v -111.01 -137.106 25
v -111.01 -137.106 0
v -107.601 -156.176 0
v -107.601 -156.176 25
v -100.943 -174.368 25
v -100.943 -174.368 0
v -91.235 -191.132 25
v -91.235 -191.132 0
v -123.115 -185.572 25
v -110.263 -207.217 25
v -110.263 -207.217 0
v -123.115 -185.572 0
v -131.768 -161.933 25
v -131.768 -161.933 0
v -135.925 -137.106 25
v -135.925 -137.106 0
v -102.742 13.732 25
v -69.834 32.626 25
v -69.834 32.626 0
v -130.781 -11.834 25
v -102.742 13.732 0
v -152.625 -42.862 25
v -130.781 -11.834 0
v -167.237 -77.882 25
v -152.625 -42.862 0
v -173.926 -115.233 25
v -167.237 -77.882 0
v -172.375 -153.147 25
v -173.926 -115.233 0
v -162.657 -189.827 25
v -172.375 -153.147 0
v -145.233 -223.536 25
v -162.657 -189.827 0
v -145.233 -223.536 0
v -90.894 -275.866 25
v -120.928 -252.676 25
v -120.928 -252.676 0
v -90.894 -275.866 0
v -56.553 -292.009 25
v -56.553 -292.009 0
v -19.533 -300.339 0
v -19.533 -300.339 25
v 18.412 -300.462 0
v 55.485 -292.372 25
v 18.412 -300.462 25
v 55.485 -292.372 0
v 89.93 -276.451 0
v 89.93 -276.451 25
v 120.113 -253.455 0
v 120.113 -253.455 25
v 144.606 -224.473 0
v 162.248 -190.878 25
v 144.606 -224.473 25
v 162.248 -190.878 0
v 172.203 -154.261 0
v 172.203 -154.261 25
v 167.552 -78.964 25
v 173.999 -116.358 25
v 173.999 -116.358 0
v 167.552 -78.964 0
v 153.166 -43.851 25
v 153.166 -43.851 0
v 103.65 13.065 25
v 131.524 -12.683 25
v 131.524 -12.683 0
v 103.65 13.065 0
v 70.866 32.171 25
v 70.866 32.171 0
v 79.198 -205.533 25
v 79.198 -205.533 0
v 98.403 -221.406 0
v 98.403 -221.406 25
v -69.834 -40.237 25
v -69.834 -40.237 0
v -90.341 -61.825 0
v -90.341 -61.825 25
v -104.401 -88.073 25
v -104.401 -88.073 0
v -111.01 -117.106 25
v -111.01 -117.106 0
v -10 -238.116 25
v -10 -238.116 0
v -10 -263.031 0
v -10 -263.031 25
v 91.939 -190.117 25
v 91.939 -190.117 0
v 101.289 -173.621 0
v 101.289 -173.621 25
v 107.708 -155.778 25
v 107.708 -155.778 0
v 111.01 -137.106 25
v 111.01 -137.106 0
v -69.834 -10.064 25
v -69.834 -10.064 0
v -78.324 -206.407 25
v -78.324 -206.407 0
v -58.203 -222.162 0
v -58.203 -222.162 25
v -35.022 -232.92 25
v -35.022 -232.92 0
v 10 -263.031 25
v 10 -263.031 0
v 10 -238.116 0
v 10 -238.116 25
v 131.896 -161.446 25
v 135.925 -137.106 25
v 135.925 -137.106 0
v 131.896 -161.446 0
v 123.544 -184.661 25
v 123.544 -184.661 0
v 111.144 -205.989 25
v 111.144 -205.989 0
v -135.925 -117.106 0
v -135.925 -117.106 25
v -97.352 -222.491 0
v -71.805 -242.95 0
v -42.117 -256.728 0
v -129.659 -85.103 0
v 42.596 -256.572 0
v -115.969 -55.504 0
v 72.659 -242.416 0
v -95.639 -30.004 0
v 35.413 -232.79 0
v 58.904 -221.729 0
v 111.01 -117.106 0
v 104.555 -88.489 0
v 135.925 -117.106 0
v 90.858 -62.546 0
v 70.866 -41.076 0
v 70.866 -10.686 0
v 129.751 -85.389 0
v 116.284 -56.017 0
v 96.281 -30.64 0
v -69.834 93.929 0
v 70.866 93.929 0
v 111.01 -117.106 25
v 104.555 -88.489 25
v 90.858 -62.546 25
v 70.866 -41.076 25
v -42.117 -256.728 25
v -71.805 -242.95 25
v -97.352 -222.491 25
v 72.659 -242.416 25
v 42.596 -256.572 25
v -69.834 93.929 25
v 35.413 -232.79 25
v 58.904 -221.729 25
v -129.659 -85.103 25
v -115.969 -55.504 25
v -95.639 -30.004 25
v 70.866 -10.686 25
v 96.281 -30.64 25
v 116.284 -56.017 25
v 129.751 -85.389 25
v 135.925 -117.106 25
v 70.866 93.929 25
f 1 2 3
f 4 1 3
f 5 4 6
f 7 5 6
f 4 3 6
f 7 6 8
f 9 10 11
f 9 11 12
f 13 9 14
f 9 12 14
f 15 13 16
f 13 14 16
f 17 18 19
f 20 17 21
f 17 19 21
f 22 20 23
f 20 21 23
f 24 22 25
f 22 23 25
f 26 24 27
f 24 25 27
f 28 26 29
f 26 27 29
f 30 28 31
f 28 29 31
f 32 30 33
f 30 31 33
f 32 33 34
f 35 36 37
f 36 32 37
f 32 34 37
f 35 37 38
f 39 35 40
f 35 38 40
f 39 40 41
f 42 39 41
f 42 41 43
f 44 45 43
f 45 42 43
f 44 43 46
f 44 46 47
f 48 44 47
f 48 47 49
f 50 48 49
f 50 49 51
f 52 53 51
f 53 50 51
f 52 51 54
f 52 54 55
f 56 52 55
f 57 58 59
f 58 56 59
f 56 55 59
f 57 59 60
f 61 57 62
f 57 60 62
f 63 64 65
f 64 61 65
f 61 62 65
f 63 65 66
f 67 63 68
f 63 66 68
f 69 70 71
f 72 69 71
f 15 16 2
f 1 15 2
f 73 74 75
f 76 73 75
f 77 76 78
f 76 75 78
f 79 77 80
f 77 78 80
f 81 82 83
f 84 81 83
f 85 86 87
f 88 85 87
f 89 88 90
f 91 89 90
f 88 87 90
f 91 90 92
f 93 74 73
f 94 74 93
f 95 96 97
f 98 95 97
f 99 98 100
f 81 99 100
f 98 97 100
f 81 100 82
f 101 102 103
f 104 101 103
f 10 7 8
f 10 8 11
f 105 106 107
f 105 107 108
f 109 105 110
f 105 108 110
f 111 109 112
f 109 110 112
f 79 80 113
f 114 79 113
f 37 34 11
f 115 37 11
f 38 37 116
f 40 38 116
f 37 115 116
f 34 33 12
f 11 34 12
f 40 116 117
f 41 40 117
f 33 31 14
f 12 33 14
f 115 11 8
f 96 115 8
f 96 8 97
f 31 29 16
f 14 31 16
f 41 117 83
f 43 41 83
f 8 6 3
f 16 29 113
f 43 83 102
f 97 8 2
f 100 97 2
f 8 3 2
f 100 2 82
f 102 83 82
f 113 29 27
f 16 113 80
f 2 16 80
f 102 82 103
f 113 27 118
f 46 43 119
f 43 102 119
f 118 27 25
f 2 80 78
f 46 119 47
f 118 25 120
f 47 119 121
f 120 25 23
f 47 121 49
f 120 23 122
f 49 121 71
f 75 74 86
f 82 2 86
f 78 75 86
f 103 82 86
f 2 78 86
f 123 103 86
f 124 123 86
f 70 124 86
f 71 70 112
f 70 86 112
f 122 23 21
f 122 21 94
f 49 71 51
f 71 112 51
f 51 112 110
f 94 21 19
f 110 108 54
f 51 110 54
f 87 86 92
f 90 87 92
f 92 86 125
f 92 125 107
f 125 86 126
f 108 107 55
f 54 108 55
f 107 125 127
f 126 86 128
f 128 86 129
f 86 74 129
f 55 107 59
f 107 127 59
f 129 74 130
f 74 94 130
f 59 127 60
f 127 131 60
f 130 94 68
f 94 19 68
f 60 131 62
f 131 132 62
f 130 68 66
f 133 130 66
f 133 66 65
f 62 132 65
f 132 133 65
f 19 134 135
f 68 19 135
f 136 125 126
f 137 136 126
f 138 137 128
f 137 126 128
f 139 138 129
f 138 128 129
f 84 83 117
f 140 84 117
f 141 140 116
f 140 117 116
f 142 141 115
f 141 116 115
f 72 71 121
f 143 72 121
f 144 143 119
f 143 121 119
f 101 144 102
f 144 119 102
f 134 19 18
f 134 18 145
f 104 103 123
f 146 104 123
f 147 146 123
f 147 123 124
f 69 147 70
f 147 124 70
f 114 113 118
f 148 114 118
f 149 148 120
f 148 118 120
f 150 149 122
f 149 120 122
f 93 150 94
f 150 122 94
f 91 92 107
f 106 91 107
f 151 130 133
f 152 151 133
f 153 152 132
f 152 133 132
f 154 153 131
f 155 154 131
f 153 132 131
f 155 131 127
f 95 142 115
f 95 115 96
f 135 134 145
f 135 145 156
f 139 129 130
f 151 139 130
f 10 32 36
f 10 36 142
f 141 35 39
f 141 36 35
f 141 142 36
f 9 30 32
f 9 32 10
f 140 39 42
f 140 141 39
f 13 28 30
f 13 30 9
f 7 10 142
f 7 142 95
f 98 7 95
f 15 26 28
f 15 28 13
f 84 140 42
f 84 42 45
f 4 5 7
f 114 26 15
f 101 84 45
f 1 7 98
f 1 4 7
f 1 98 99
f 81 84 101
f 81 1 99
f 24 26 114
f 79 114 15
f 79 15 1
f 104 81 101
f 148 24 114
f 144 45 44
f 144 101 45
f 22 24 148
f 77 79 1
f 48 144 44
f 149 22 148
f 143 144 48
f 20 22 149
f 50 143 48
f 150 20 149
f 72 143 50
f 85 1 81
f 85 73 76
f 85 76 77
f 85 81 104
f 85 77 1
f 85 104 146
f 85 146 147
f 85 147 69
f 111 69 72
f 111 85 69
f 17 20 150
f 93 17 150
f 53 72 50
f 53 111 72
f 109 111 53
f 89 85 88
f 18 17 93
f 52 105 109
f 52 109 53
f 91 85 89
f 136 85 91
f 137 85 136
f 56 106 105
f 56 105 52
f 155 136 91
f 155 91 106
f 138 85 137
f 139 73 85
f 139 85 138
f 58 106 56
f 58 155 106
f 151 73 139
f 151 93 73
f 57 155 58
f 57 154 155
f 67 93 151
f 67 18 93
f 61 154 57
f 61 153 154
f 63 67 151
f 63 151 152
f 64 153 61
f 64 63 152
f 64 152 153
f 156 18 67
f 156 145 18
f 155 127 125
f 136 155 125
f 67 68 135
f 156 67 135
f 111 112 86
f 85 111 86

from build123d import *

# Parameters (mm, degrees)
F0_W     = 140.7
F0_H     = 280
F1_DEPTH = 25
F2_R     = 174.3309751569
F3_DEPTH = 25


with BuildPart() as f1:
    # F0 (on Top) → F1 (new body)
    with BuildSketch(Plane.XY):
        with Locations((0.5157602191, -46.0708594322)):
            Rectangle(F0_W, F0_H)
    extrude(amount=F1_DEPTH)

    # F2 (on Top) → F3 (join)
    with BuildSketch(Plane.XY):
        with Locations((0, -127.1062195301)):
            Circle(F2_R)
        with BuildLine():
            ThreePointArc((135.9251850135, -117.1062195301), (136.2006688085, -122.1028469617), (136.2925380237, -127.1062195301))
            ThreePointArc((136.2925380237, -127.1062195301), (136.2006688085, -132.1095920985), (135.9251850135, -137.1062195301))
            ThreePointArc((135.9251850135, -137.1062195301), (128.2461669599, -173.2427189751), (111.1444855362, -205.9894196163))
            ThreePointArc((111.1444855362, -205.9894196163), (105.0571290732, -213.9316510109), (98.4034458961, -221.4058364791))
            ThreePointArc((98.4034458961, -221.4058364791), (58.0603027008, -250.4133854664), (10, -263.0314045436))
            ThreePointArc((10, -263.0314045436), (0, -263.3987575538), (-10, -263.0314045436))
            ThreePointArc((-10, -263.0314045436), (-57.3758238008, -250.7333636536), (-97.3518624436, -222.4910757689))
            ThreePointArc((-97.3518624436, -222.4910757689), (-104.0880057129, -215.0911215739), (-110.2630464775, -207.2168711467))
            ThreePointArc((-110.2630464775, -207.2168711467), (-127.9884260341, -173.9529773929), (-135.9251850135, -137.1062195301))
            ThreePointArc((-135.9251850135, -137.1062195301), (-136.2925380237, -127.1062195301), (-135.9251850135, -117.1062195301))
            ThreePointArc((-135.9251850135, -117.1062195301), (0, 9.1863184936), (135.9251850135, -117.1062195301))
        make_face(mode=Mode.SUBTRACT)
        with BuildLine():
            ThreePointArc((111.4590298101, -127.1062195301), (111.3465976726, -122.1011707841), (111.0095280875, -117.1062195301))
            ThreePointArc((111.0095280875, -117.1062195301), (0, -15.64718972), (-111.0095280875, -117.1062195301))
            ThreePointArc((-111.0095280875, -117.1062195301), (-111.4590298101, -127.1062195301), (-111.0095280875, -137.1062195301))
            ThreePointArc((-111.0095280875, -137.1062195301), (-104.667988428, -165.4171517121), (-91.2347043683, -191.1323395519))
            ThreePointArc((-91.2347043683, -191.1323395519), (-85.1224014158, -199.0596218362), (-78.3235203344, -206.4065441741))
            ThreePointArc((-78.3235203344, -206.4065441741), (-46.9215244512, -228.2075838601), (-10, -238.1157476176))
            ThreePointArc((-10, -238.1157476176), (0, -238.5652493402), (10, -238.1157476176))
            ThreePointArc((10, -238.1157476176), (47.4812862344, -227.9459080646), (79.197938217, -205.5332678514))
            ThreePointArc((79.197938217, -205.5332678514), (85.9149433339, -198.1114153833), (91.9389778571, -190.1168509886))
            ThreePointArc((91.9389778571, -190.1168509886), (104.8787670513, -164.8363076298), (111.0095280875, -137.1062195301))
            ThreePointArc((111.0095280875, -137.1062195301), (111.3465976726, -132.1112682761), (111.4590298101, -127.1062195301))
        make_face()
        with BuildLine():
            ThreePointArc((-10, -263.0314045436), (0, -263.3987575538), (10, -263.0314045436))
            Line((10, -263.0314045436), (10, -238.1157476176))
            ThreePointArc((10, -238.1157476176), (0, -238.5652493402), (-10, -238.1157476176))
            Line((-10, -238.1157476176), (-10, -263.0314045436))
        make_face()
        with BuildLine():
            Line((-111.0095280875, -117.1062195301), (-135.9251850135, -117.1062195301))
            ThreePointArc((-135.9251850135, -117.1062195301), (-136.2925380237, -127.1062195301), (-135.9251850135, -137.1062195301))
            Line((-135.9251850135, -137.1062195301), (-111.0095280875, -137.1062195301))
            ThreePointArc((-111.0095280875, -137.1062195301), (-111.4590298101, -127.1062195301), (-111.0095280875, -117.1062195301))
        make_face()
        with BuildLine():
            Line((-91.2347043683, -191.1323395519), (-110.2630464775, -207.2168711467))
            ThreePointArc((-110.2630464775, -207.2168711467), (-104.0880057129, -215.0911215739), (-97.3518624436, -222.4910757689))
            Line((-97.3518624436, -222.4910757689), (-78.3235203344, -206.4065441741))
            ThreePointArc((-78.3235203344, -206.4065441741), (-85.1224014158, -199.0596218362), (-91.2347043683, -191.1323395519))
        make_face()
        with BuildLine():
            ThreePointArc((98.4034458961, -221.4058364791), (105.0571290732, -213.9316510109), (111.1444855362, -205.9894196163))
            Line((111.1444855362, -205.9894196163), (91.9389778571, -190.1168509886))
            ThreePointArc((91.9389778571, -190.1168509886), (85.9149433339, -198.1114153833), (79.197938217, -205.5332678514))
            Line((79.197938217, -205.5332678514), (98.4034458961, -221.4058364791))
        make_face()
        with BuildLine():
            ThreePointArc((135.9251850135, -137.1062195301), (136.2006688085, -132.1095920985), (136.2925380237, -127.1062195301))
            ThreePointArc((136.2925380237, -127.1062195301), (136.2006688085, -122.1028469617), (135.9251850135, -117.1062195301))
            Line((135.9251850135, -117.1062195301), (111.0095280875, -117.1062195301))
            ThreePointArc((111.0095280875, -117.1062195301), (111.3465976726, -122.1011707841), (111.4590298101, -127.1062195301))
            ThreePointArc((111.4590298101, -127.1062195301), (111.3465976726, -132.1112682761), (111.0095280875, -137.1062195301))
            Line((111.0095280875, -137.1062195301), (135.9251850135, -137.1062195301))
        make_face()
    extrude(amount=F3_DEPTH)


solid = f1.part
